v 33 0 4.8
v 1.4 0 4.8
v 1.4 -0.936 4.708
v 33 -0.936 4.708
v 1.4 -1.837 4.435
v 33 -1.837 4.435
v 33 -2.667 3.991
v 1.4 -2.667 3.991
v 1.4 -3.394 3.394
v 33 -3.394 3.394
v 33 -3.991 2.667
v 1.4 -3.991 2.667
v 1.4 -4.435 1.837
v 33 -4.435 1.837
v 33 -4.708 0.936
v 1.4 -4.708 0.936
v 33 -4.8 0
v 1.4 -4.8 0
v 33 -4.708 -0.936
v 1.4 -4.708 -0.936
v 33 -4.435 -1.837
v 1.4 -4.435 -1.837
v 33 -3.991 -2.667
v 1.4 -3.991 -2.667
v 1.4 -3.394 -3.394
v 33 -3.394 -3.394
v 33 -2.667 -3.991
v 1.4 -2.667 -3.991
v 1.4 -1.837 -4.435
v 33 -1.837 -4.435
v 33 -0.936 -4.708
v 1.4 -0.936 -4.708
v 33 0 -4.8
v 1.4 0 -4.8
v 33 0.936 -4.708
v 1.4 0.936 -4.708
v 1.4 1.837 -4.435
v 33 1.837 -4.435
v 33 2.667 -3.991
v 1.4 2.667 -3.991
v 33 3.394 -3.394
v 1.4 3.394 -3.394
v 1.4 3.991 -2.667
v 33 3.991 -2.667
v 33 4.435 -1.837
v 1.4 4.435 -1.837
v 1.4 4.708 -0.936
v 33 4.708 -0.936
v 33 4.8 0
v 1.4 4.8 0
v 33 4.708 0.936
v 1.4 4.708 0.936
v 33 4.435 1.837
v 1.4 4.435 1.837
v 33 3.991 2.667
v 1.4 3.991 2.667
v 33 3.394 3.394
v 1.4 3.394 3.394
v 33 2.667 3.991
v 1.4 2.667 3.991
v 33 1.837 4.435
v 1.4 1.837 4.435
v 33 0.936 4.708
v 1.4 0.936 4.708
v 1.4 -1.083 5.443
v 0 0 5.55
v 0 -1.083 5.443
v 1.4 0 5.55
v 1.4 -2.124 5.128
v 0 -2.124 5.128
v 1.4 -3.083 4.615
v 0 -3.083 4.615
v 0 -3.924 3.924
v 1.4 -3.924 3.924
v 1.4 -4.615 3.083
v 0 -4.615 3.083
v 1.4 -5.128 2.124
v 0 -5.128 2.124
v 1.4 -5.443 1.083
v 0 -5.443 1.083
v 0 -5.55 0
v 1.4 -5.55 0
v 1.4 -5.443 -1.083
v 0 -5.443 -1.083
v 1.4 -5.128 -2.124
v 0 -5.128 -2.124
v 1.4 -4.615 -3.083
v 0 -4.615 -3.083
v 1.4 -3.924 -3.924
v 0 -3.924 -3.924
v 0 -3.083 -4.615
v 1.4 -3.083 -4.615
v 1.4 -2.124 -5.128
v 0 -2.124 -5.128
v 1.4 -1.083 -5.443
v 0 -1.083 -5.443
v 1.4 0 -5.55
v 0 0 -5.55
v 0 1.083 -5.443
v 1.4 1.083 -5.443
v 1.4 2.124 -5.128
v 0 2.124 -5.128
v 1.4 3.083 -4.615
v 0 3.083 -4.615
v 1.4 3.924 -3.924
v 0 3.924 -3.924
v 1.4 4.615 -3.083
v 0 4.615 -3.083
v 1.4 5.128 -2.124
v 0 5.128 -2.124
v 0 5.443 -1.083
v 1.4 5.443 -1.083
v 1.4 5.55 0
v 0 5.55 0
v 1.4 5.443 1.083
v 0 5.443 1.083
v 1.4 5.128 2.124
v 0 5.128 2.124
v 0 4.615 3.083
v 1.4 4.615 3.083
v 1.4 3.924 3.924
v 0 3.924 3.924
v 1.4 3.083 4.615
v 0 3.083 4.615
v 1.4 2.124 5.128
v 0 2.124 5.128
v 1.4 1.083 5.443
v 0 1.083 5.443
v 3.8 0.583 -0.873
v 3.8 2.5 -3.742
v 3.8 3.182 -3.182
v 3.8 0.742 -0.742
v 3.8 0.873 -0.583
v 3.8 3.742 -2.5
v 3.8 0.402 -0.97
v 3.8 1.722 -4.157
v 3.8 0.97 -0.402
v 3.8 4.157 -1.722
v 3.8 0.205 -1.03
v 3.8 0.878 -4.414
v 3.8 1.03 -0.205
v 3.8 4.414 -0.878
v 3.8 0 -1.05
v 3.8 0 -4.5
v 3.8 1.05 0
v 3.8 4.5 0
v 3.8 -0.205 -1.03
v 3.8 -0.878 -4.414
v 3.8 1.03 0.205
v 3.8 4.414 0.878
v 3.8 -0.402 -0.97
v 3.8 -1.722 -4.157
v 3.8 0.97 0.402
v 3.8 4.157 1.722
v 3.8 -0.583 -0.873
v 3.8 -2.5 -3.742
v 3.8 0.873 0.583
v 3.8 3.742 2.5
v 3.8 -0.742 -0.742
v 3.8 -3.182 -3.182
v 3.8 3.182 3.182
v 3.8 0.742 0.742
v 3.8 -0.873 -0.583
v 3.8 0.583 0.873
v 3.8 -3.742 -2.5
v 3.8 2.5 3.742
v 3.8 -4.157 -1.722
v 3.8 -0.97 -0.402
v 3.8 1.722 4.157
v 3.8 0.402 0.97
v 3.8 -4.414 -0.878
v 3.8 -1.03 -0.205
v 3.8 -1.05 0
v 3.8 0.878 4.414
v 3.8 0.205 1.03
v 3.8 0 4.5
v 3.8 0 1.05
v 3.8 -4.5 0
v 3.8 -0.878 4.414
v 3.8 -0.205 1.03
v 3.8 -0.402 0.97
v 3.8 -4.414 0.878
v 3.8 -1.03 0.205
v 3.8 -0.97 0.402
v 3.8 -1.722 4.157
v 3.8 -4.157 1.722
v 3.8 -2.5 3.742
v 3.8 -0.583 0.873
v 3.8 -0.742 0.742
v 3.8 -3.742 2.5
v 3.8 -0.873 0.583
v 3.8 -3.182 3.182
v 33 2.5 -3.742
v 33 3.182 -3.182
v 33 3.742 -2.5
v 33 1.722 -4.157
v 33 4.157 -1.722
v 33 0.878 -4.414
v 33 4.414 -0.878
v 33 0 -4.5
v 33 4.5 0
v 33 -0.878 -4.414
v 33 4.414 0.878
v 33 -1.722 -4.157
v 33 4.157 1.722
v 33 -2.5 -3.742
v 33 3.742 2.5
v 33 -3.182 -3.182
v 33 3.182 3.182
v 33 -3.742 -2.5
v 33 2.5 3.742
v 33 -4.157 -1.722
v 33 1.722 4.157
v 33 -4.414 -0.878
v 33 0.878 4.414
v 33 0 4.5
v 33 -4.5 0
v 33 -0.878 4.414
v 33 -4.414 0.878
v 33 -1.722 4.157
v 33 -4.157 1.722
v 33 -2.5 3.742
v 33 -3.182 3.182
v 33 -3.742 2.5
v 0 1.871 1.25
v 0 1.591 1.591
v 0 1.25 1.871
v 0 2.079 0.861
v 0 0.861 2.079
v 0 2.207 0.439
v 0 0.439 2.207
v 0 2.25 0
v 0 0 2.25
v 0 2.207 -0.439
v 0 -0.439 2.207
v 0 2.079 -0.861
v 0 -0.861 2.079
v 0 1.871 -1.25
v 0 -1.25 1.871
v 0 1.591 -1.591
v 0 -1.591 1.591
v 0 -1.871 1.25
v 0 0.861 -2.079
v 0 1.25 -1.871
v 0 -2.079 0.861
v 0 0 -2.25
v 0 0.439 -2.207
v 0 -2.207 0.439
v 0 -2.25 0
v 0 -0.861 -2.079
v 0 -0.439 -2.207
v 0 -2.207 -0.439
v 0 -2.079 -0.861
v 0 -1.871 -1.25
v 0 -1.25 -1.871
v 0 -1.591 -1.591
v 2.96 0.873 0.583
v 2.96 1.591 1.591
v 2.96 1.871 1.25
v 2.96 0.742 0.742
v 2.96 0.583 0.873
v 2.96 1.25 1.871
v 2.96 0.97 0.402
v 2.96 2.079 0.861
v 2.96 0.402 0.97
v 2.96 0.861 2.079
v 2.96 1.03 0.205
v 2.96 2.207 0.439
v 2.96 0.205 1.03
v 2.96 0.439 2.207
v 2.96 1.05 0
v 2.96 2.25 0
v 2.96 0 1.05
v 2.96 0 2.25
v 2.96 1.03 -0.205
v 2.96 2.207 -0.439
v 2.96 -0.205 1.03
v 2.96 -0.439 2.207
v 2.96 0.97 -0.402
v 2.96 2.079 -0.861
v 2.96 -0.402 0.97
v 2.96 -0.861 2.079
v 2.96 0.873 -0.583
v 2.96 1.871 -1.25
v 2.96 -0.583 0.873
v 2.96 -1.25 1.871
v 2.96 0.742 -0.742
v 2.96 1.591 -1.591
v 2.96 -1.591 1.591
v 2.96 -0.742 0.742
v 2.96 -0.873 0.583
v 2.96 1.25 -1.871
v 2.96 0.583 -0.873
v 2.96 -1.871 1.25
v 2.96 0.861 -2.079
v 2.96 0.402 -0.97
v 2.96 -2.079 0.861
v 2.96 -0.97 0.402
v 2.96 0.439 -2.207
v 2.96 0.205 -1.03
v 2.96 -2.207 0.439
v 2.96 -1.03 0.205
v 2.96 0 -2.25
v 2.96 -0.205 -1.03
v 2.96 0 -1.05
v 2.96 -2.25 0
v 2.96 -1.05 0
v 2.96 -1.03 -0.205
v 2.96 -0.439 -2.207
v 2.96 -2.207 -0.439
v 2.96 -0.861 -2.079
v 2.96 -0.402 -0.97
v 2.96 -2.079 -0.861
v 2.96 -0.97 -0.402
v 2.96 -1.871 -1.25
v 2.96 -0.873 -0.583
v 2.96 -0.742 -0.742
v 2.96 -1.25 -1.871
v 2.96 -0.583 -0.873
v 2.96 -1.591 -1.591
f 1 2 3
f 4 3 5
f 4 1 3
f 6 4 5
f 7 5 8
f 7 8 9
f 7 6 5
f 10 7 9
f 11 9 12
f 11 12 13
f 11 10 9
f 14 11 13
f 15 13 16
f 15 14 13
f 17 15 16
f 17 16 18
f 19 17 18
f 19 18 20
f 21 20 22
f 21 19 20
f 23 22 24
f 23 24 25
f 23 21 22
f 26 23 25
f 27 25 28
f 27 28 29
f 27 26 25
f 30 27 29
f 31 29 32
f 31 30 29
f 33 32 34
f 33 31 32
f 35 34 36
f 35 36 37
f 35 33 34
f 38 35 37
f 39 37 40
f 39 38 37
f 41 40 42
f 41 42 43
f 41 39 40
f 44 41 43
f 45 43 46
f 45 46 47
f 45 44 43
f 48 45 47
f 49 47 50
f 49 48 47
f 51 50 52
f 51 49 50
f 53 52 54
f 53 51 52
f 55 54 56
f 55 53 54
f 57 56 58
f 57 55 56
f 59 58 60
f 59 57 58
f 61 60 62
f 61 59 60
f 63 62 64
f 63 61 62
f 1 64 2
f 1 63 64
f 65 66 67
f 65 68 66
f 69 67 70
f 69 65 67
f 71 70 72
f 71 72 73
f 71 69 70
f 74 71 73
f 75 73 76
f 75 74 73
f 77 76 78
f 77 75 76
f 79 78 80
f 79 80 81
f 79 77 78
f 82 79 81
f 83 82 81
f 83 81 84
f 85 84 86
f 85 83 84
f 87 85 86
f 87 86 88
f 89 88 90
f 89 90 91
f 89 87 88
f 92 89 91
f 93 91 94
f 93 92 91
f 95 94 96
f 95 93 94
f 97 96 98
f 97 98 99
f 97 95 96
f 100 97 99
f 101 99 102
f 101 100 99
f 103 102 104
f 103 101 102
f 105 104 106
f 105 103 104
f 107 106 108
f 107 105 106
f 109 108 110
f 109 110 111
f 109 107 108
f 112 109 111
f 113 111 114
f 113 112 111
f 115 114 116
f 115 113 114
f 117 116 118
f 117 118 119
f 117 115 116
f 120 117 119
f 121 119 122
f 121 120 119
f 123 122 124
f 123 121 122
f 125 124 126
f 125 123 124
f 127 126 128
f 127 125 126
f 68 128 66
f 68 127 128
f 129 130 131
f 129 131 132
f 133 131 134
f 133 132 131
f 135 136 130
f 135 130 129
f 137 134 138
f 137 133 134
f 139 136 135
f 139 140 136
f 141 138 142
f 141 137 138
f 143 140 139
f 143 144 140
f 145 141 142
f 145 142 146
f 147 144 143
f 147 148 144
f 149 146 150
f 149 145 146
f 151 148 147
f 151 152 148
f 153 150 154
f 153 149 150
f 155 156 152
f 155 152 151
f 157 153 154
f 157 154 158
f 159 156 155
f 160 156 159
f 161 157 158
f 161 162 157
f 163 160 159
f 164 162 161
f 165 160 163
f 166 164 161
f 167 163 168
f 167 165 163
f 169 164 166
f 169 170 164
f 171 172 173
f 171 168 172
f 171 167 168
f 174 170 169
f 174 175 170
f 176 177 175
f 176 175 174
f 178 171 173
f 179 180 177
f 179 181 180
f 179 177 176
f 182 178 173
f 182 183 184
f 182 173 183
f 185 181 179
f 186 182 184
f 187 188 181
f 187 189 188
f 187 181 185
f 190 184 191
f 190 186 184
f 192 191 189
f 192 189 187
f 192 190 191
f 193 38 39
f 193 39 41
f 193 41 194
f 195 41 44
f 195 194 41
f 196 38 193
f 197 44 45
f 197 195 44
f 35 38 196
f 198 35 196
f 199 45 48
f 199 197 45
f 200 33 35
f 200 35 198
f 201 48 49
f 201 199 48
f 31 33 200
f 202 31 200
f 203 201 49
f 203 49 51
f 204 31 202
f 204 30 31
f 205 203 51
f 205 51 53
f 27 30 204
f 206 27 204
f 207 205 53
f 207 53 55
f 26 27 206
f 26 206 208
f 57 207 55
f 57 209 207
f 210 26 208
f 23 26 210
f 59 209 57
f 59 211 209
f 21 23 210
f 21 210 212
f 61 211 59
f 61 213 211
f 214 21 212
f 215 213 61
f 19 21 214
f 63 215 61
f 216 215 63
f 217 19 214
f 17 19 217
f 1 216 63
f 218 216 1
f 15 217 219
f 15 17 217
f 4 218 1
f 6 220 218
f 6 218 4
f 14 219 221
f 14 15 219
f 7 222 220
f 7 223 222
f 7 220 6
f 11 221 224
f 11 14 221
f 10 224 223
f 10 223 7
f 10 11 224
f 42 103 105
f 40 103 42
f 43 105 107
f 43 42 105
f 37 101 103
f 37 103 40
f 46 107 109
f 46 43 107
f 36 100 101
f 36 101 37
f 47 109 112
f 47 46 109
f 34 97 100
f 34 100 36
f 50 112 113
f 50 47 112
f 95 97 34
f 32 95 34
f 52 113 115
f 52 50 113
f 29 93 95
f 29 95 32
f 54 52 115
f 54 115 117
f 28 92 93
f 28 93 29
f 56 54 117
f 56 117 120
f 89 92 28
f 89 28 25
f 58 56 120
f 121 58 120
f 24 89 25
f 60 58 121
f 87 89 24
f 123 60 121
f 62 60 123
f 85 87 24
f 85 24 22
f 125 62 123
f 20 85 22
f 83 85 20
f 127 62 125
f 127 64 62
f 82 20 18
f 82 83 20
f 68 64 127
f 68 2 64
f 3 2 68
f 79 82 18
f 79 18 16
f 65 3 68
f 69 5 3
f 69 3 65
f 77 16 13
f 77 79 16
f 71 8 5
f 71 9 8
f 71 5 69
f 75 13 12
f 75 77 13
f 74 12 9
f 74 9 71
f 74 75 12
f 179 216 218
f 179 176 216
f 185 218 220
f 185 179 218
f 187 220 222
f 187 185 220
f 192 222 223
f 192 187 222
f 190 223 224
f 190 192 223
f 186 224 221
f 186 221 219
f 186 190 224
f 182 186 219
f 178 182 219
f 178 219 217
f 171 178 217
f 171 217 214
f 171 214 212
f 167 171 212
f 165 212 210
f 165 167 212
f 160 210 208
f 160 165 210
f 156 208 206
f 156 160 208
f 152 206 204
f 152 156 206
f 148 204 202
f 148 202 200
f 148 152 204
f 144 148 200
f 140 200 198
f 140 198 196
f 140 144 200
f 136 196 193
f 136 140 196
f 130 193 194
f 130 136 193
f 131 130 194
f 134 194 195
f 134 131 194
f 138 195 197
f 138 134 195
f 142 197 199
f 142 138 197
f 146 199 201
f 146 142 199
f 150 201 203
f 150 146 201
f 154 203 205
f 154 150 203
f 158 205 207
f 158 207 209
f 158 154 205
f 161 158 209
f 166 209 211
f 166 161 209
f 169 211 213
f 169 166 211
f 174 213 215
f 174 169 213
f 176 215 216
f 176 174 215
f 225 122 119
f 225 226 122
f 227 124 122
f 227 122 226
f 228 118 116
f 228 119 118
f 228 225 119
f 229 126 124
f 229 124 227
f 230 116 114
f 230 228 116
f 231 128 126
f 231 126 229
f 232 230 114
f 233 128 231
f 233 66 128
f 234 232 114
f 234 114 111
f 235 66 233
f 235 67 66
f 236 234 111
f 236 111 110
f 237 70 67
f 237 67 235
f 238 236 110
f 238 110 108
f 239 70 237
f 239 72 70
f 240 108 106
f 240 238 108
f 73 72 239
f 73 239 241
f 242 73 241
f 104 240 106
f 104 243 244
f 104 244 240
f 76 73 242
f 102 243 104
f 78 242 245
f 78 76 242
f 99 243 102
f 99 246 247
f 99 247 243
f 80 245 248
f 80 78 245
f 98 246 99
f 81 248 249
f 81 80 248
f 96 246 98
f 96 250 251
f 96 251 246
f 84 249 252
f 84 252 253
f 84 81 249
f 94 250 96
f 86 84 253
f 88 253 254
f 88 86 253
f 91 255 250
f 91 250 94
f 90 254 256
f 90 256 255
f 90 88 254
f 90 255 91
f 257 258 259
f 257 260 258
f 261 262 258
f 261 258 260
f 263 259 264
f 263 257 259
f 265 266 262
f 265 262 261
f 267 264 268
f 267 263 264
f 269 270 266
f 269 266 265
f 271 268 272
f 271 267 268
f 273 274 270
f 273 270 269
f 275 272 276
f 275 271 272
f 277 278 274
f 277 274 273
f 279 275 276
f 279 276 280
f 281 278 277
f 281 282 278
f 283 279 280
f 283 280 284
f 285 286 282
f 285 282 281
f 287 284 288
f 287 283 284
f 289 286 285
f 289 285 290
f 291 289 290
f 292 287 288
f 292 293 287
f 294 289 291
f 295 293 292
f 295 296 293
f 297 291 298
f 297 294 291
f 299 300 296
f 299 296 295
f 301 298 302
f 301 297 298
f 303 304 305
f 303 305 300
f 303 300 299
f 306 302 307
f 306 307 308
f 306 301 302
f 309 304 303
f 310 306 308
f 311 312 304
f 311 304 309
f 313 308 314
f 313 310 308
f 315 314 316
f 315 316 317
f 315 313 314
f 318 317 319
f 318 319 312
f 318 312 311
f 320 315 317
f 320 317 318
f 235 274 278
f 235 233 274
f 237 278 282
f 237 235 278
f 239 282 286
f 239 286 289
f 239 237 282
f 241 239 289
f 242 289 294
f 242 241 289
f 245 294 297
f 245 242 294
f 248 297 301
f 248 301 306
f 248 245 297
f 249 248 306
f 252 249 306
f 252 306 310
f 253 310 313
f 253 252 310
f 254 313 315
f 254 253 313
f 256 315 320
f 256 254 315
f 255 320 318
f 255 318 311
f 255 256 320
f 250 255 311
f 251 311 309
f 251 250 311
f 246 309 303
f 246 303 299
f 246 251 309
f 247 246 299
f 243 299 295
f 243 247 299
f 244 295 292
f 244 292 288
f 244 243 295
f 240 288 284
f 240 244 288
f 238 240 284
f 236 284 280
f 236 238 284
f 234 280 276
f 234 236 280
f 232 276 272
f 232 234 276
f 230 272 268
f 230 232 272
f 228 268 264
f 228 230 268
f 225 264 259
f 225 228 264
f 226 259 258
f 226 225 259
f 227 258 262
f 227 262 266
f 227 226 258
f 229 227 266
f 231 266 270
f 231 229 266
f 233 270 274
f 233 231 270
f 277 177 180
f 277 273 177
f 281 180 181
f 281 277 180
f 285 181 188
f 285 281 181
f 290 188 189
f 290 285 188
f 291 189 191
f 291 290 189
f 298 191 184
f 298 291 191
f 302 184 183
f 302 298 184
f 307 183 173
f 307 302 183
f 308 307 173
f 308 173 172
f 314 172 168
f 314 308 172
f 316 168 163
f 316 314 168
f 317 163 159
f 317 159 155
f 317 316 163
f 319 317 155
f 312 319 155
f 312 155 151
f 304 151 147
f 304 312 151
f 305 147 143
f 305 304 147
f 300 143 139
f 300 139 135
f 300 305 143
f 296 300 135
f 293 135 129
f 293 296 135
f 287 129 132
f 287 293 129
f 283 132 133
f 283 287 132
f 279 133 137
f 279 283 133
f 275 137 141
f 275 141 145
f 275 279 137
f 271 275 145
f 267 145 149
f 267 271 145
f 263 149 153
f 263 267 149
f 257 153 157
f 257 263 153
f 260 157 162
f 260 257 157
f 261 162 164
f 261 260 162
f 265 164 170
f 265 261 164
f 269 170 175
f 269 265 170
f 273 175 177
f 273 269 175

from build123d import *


with BuildPart() as part:
    # Esboço1 → Revolução1 (revolve)
    with BuildSketch(Plane(origin=(0, 0, 0), x_dir=(1, 0, 0), z_dir=(0, 1, 0)), mode=Mode.PRIVATE) as revolu_o1_sk:
        Polygon((3.8, 1.05), (2.960398706, 1.05), (2.960398706, 2.25), (0, 2.25), (0, 5.55), (1.4, 5.55), (1.4, 4.8), (33, 4.8), (33, 4.5), (3.8, 4.5), align=None)
    revolve(revolu_o1_sk.sketch.rotate(Axis((0, 0, 0), (1, 0, 0)), 180), axis=Axis((0, 0, 0), (1, 0, 0)))


solid = part.part
